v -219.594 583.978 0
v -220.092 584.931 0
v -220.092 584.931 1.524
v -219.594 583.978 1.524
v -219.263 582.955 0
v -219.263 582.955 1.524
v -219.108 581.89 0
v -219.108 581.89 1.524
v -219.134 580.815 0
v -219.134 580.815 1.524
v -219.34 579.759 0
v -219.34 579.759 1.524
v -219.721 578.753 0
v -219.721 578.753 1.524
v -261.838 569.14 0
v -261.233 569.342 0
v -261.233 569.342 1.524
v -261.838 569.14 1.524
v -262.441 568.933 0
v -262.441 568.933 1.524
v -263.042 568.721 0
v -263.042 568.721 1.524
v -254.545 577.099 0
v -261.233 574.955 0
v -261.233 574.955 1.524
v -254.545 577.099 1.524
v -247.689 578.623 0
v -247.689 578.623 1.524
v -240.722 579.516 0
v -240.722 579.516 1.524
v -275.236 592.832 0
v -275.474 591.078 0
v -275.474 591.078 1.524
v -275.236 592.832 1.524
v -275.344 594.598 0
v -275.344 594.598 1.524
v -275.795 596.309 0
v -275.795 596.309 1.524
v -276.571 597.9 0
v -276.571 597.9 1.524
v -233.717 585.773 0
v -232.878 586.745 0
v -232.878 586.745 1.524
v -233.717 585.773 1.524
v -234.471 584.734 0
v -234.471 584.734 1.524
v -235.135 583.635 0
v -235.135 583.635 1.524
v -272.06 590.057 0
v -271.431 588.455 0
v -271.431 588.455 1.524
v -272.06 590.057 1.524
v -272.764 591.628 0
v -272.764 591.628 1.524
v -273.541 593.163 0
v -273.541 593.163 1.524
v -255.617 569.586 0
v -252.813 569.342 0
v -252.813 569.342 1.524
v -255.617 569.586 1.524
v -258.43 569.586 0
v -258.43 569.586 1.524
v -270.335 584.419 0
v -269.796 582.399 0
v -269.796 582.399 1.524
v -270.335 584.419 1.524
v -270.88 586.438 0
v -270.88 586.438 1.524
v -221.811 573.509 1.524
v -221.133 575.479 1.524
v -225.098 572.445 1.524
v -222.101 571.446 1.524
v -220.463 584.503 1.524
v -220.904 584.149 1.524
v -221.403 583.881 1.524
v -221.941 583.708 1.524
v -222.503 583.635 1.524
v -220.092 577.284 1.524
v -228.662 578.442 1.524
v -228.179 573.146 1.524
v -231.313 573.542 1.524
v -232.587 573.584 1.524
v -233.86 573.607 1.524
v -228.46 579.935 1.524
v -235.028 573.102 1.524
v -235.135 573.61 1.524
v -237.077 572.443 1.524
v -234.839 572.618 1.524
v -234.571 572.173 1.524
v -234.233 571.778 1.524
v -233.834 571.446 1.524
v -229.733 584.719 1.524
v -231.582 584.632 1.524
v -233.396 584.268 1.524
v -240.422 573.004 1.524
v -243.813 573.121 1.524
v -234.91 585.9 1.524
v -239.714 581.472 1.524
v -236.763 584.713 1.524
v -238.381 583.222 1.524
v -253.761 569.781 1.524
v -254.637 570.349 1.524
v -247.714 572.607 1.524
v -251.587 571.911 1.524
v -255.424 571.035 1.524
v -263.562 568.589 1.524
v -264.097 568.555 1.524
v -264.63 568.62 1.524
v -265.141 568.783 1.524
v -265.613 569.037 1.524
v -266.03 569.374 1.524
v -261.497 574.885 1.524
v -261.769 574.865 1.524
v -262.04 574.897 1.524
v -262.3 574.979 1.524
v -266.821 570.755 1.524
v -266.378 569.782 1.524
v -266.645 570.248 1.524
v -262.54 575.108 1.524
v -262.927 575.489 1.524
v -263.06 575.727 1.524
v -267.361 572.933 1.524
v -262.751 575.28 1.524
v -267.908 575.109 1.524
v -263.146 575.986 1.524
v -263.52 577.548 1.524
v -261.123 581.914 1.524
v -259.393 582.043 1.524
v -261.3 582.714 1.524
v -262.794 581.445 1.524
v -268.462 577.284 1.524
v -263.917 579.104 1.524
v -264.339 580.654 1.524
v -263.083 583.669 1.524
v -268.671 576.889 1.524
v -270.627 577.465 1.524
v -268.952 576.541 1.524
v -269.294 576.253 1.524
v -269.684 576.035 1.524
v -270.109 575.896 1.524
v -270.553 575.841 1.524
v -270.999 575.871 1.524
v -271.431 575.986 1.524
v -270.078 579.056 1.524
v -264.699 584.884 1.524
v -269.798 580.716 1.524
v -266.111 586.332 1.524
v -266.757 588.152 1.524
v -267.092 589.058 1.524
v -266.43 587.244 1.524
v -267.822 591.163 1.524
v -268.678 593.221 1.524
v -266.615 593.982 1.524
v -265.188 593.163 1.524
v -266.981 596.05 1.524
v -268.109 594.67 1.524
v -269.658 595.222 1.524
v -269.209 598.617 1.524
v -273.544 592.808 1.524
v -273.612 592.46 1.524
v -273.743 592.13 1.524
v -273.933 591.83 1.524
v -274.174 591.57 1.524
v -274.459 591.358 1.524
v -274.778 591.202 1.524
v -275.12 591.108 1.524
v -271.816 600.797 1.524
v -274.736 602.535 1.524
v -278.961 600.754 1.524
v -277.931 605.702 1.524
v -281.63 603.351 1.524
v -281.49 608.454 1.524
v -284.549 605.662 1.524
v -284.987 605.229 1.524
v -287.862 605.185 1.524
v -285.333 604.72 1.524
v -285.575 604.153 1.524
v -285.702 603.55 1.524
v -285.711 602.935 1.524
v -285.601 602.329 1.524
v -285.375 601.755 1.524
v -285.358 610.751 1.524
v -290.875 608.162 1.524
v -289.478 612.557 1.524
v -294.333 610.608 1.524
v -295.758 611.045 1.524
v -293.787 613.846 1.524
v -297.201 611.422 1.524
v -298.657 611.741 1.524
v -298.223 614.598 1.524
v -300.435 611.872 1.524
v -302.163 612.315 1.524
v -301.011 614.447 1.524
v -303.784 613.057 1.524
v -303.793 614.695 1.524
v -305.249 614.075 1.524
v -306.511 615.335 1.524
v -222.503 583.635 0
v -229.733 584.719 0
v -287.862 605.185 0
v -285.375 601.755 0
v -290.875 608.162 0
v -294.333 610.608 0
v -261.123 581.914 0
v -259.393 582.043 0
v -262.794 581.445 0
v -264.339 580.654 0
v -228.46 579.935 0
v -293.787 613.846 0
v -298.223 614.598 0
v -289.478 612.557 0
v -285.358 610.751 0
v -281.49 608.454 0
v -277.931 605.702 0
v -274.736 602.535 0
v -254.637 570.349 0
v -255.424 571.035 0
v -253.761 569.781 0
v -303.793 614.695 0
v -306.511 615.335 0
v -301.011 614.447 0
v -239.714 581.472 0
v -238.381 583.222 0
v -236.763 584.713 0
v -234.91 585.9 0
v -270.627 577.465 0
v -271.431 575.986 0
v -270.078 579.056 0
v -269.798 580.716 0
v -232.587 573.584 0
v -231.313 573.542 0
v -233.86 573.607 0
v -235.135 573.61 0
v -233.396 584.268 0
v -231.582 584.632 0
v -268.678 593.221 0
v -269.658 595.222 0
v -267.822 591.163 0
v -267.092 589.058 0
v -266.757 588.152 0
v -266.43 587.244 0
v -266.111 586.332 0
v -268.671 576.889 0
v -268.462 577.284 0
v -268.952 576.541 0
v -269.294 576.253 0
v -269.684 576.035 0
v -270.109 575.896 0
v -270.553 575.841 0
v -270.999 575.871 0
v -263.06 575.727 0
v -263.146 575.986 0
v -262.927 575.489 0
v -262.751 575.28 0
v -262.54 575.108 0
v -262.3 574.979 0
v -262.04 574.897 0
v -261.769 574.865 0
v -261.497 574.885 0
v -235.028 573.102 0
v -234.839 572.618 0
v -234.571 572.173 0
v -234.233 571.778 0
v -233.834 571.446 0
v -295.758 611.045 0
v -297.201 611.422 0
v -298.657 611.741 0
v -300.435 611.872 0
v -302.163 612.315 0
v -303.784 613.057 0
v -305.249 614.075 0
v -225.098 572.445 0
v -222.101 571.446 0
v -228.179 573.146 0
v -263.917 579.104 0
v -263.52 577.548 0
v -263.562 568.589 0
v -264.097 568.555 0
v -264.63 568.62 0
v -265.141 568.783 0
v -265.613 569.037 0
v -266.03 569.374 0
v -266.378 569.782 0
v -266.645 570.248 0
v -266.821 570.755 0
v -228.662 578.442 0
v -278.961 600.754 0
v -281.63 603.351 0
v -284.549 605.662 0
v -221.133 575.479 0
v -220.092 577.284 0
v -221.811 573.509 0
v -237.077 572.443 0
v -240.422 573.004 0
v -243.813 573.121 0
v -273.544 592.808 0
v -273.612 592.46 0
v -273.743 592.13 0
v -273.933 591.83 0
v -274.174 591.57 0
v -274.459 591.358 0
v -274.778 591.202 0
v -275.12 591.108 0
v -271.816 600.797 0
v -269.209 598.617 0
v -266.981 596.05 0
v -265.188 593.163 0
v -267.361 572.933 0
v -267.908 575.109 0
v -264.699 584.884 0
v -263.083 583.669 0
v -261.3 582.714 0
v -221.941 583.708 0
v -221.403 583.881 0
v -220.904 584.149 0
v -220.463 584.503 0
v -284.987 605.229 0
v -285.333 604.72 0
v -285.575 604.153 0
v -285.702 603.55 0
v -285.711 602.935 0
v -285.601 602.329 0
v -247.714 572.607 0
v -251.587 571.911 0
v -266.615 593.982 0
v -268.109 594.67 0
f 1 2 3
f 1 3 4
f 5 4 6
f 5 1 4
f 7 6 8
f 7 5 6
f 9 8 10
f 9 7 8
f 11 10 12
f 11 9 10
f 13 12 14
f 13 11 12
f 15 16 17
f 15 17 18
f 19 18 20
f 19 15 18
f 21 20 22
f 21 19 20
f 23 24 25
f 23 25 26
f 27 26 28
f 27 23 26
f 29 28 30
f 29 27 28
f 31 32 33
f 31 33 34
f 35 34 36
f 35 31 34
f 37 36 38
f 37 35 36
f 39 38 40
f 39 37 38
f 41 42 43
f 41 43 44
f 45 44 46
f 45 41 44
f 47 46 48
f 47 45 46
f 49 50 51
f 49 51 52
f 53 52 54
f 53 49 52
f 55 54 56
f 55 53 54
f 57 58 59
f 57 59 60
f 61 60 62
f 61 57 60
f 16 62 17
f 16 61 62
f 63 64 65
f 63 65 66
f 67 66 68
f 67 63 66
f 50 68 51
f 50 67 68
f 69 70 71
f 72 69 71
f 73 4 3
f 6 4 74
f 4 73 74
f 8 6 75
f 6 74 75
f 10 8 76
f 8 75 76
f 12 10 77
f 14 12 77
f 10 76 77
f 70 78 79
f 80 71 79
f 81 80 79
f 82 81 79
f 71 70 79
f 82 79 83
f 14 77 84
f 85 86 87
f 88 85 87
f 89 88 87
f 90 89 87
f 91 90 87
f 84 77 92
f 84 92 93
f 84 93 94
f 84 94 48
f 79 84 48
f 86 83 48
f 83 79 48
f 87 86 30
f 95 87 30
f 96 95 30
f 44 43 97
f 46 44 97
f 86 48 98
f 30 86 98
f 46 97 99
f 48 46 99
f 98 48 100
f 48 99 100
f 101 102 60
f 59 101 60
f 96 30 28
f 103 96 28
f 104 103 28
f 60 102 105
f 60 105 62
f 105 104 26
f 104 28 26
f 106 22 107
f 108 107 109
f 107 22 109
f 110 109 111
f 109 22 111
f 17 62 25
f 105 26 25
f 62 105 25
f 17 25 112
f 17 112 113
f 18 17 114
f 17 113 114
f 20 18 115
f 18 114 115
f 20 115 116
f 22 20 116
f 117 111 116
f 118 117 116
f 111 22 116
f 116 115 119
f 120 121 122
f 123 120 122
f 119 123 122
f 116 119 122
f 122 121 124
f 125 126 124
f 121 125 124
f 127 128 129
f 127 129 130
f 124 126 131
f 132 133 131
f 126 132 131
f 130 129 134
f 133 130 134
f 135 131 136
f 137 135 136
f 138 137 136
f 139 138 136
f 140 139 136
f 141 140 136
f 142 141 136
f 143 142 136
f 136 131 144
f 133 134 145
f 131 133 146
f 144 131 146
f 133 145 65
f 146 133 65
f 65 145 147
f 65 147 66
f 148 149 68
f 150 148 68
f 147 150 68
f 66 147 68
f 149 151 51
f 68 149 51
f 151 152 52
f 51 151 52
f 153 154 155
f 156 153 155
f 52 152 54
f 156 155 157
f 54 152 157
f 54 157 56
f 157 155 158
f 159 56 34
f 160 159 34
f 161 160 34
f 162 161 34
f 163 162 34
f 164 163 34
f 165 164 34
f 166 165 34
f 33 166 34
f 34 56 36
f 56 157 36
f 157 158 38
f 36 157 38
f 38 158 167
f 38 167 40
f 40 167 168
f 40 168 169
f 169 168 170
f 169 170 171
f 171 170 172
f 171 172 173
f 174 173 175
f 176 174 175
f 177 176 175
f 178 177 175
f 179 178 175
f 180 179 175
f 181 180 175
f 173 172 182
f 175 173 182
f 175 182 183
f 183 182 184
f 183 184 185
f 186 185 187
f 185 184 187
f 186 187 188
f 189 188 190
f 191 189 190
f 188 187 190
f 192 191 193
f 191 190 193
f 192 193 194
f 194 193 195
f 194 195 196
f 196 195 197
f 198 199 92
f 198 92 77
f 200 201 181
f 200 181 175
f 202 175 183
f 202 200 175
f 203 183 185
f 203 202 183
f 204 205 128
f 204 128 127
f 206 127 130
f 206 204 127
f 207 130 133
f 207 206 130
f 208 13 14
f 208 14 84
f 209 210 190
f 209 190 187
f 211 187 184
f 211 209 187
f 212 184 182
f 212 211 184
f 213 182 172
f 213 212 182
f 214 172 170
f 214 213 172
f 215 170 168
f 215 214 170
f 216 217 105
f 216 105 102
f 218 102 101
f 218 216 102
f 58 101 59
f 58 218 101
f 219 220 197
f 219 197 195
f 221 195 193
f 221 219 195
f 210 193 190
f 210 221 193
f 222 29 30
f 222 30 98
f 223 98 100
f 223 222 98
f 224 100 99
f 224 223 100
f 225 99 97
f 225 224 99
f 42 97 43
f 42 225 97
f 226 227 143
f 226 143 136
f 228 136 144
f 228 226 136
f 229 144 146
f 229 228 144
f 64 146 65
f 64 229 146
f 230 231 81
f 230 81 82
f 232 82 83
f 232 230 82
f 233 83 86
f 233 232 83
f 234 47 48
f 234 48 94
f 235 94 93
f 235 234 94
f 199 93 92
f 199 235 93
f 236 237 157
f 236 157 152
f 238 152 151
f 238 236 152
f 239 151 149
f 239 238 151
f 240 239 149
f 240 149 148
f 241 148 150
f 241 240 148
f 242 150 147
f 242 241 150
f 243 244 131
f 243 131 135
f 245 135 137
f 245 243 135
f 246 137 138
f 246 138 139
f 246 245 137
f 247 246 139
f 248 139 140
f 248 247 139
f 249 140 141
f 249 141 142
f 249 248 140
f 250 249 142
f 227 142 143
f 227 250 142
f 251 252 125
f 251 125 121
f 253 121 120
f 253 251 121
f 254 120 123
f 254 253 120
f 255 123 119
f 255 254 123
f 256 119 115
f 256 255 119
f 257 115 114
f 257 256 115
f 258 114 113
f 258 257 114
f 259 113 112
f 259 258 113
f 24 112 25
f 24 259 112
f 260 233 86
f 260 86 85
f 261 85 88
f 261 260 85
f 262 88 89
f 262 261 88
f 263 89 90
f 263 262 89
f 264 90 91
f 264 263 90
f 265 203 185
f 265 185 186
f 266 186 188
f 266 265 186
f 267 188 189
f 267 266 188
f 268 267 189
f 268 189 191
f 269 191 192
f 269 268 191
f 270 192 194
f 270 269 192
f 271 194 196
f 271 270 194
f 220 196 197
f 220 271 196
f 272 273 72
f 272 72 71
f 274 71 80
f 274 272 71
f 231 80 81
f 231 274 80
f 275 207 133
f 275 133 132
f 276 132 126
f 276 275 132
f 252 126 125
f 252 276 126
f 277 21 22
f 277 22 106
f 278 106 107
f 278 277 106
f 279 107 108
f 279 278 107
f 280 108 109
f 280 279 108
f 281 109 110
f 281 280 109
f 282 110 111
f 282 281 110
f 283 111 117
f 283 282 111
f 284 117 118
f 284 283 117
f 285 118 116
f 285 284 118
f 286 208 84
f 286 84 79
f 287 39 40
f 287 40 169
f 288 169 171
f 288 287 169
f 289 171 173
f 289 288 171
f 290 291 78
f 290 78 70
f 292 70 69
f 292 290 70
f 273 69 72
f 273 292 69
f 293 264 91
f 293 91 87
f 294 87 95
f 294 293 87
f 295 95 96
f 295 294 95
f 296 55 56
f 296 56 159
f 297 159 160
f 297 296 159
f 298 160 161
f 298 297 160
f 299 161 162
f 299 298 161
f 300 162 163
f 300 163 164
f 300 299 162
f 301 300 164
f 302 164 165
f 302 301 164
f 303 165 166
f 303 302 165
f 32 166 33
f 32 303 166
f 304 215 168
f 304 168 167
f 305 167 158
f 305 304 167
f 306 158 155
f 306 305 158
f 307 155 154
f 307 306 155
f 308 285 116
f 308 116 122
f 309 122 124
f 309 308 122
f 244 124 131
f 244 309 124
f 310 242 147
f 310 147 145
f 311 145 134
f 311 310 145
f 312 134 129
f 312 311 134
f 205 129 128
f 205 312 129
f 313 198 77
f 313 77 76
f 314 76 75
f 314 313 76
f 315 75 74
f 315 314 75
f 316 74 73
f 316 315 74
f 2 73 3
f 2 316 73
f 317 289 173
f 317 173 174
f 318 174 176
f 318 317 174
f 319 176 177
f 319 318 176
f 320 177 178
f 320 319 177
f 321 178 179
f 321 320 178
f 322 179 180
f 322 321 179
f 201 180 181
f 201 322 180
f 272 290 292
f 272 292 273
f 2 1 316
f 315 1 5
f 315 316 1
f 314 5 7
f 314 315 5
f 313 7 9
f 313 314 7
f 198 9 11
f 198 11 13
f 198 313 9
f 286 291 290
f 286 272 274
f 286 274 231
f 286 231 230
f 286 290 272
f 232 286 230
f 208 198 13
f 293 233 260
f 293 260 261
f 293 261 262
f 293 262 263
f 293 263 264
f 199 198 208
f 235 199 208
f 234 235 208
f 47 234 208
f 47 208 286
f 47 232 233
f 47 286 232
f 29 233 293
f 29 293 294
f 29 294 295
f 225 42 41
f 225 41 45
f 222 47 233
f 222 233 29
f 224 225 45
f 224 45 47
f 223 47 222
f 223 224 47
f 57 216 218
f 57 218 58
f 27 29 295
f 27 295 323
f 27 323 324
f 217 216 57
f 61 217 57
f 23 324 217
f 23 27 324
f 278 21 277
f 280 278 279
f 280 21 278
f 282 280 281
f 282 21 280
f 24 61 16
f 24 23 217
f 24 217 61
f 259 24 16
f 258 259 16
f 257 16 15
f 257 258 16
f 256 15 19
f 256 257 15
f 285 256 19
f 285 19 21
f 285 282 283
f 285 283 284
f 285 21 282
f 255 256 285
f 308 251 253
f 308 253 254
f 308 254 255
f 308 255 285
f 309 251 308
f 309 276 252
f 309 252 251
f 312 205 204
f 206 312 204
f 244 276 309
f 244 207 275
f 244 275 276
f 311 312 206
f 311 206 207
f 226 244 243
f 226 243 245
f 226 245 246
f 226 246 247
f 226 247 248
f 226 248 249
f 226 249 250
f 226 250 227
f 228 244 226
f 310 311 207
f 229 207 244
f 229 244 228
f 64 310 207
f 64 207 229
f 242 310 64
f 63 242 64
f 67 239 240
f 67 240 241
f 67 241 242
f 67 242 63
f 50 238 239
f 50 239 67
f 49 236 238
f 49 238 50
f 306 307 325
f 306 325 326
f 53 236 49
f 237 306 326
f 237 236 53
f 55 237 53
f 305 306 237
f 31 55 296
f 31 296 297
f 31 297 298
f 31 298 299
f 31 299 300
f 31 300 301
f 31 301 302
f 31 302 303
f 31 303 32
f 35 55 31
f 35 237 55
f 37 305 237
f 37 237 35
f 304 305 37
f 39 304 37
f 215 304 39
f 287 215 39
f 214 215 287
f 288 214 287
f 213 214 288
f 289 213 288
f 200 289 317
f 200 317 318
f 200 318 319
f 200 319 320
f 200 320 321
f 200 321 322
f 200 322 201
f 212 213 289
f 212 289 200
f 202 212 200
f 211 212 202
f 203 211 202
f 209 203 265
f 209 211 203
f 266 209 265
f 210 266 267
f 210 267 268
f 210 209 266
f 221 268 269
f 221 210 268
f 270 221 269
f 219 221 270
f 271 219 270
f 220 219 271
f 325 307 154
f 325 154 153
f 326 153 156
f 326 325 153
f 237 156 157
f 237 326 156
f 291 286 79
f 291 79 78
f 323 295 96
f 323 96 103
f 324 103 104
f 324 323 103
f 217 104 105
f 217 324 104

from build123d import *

# Parameters (mm, degrees)
BOSS_EXTRUDE1_DEPTH = 1.524


with BuildPart() as part:
    # Sketch1 → Boss-Extrude1 (new body)
    with BuildSketch(Plane.XY):
        with BuildLine():
            Line((-229.733299104, 584.719331839), (-222.502527935, 583.634973996))
            ThreePointArc((-222.502527935, 583.634973996), (-221.147267888, 584.004051618), (-220.092288362, 584.931395291))
            ThreePointArc((-220.092288362, 584.931395291), (-219.107825608, 581.890435474), (-219.721109978, 578.753480613))
            Line((-219.721109978, 578.753480613), (-228.459709631, 579.934984791))
            Line((-228.459709631, 579.934984791), (-228.661688518, 578.44207641))
            Line((-228.661688518, 578.44207641), (-220.092288362, 577.283710625))
            ThreePointArc((-220.092288362, 577.283710625), (-221.51932816, 574.510272261), (-222.100657588, 571.445886672))
            ThreePointArc((-222.100657588, 571.445886672), (-226.629664964, 572.833617667), (-231.313271906, 573.541806308))
            ThreePointArc((-231.313271906, 573.541806308), (-233.223508643, 573.597615767), (-235.134519327, 573.610155801))
            ThreePointArc((-235.134519327, 573.610155801), (-234.714498742, 572.38977797), (-233.834266637, 571.445886672))
            ThreePointArc((-233.834266637, 571.445886672), (-238.740309086, 572.778591559), (-243.812582366, 573.121226369))
            ThreePointArc((-243.812582366, 573.121226369), (-249.654593018, 572.281403909), (-255.423617198, 571.035309918))
            ThreePointArc((-255.423617198, 571.035309918), (-254.208732466, 570.049679285), (-252.813402451, 569.342242498))
            ThreePointArc((-252.813402451, 569.342242498), (-257.023373112, 569.616476447), (-261.233343772, 569.342242498))
            ThreePointArc((-261.233343772, 569.342242498), (-262.139462052, 569.036834334), (-263.042061741, 568.721179006))
            ThreePointArc((-263.042061741, 568.721179006), (-265.382908747, 568.898961953), (-266.820790496, 570.754674096))
            ThreePointArc((-266.820790496, 570.754674096), (-267.633321548, 574.021224174), (-268.462018281, 577.283710625))
            ThreePointArc((-268.462018281, 577.283710625), (-269.684214588, 576.035290864), (-271.430597221, 575.985658132))
            ThreePointArc((-271.430597221, 575.985658132), (-270.077505732, 579.055656064), (-269.795996664, 582.398782822))
            ThreePointArc((-269.795996664, 582.398782822), (-270.6063104, 585.428884975), (-271.430597221, 588.455215862))
            ThreePointArc((-271.430597221, 588.455215862), (-272.402462147, 590.846491133), (-273.540779849, 593.163159358))
            ThreePointArc((-273.540779849, 593.163159358), (-274.047233126, 591.694203826), (-275.473581255, 591.077878999))
            ThreePointArc((-275.473581255, 591.077878999), (-275.34428452, 594.597865441), (-276.57079113, 597.899789688))
            ThreePointArc((-276.57079113, 597.899789688), (-280.26245264, 602.086630283), (-284.548965797, 605.662074848))
            ThreePointArc((-284.548965797, 605.662074848), (-285.652879269, 603.854761803), (-285.375456051, 601.755228103))
            ThreePointArc((-285.375456051, 601.755228103), (-289.30709222, 606.735438718), (-294.333091655, 610.608369187))
            ThreePointArc((-294.333091655, 610.608369187), (-296.477583287, 611.240889296), (-298.65675661, 611.741018952))
            ThreePointArc((-298.65675661, 611.741018952), (-302.990086346, 612.65022374), (-306.51096198, 615.334964829))
            ThreePointArc((-306.51096198, 615.334964829), (-302.406354647, 614.521452362), (-298.222601436, 614.597695151))
            ThreePointArc((-298.222601436, 614.597695151), (-285.35767493, 610.750777653), (-274.736325292, 602.53542373))
            ThreePointArc((-274.736325292, 602.53542373), (-269.209056442, 598.616541826), (-265.187992407, 593.163159358))
            ThreePointArc((-265.187992407, 593.163159358), (-267.353928299, 594.342358031), (-269.657730455, 595.222291793))
            ThreePointArc((-269.657730455, 595.222291793), (-268.234509905, 592.198490903), (-267.092140084, 589.057803121))
            ThreePointArc((-267.092140084, 589.057803121), (-266.592090958, 587.698505955), (-266.111218097, 586.33230714))
            ThreePointArc((-266.111218097, 586.33230714), (-263.083103018, 583.668794976), (-259.392672976, 582.04260185))
            ThreePointArc((-259.392672976, 582.04260185), (-261.970528382, 581.721095666), (-264.339245348, 580.654378901))
            ThreePointArc((-264.339245348, 580.654378901), (-263.715375229, 578.327001479), (-263.146155659, 575.985658132))
            ThreePointArc((-263.146155659, 575.985658132), (-262.422892661, 575.037653784), (-261.233343772, 574.955221701))
            ThreePointArc((-261.233343772, 574.955221701), (-251.134066148, 577.939069272), (-240.721980879, 579.516166347))
            ThreePointArc((-240.721980879, 579.516166347), (-237.604479811, 584.0033655), (-232.878306602, 586.745090494))
            ThreePointArc((-232.878306602, 586.745090494), (-234.104874481, 585.261460478), (-235.134519327, 583.634973996))
            ThreePointArc((-235.134519327, 583.634973996), (-232.495519695, 584.484036639), (-229.733299104, 584.719331839))
        make_face()
    extrude(amount=BOSS_EXTRUDE1_DEPTH)


solid = part.part
